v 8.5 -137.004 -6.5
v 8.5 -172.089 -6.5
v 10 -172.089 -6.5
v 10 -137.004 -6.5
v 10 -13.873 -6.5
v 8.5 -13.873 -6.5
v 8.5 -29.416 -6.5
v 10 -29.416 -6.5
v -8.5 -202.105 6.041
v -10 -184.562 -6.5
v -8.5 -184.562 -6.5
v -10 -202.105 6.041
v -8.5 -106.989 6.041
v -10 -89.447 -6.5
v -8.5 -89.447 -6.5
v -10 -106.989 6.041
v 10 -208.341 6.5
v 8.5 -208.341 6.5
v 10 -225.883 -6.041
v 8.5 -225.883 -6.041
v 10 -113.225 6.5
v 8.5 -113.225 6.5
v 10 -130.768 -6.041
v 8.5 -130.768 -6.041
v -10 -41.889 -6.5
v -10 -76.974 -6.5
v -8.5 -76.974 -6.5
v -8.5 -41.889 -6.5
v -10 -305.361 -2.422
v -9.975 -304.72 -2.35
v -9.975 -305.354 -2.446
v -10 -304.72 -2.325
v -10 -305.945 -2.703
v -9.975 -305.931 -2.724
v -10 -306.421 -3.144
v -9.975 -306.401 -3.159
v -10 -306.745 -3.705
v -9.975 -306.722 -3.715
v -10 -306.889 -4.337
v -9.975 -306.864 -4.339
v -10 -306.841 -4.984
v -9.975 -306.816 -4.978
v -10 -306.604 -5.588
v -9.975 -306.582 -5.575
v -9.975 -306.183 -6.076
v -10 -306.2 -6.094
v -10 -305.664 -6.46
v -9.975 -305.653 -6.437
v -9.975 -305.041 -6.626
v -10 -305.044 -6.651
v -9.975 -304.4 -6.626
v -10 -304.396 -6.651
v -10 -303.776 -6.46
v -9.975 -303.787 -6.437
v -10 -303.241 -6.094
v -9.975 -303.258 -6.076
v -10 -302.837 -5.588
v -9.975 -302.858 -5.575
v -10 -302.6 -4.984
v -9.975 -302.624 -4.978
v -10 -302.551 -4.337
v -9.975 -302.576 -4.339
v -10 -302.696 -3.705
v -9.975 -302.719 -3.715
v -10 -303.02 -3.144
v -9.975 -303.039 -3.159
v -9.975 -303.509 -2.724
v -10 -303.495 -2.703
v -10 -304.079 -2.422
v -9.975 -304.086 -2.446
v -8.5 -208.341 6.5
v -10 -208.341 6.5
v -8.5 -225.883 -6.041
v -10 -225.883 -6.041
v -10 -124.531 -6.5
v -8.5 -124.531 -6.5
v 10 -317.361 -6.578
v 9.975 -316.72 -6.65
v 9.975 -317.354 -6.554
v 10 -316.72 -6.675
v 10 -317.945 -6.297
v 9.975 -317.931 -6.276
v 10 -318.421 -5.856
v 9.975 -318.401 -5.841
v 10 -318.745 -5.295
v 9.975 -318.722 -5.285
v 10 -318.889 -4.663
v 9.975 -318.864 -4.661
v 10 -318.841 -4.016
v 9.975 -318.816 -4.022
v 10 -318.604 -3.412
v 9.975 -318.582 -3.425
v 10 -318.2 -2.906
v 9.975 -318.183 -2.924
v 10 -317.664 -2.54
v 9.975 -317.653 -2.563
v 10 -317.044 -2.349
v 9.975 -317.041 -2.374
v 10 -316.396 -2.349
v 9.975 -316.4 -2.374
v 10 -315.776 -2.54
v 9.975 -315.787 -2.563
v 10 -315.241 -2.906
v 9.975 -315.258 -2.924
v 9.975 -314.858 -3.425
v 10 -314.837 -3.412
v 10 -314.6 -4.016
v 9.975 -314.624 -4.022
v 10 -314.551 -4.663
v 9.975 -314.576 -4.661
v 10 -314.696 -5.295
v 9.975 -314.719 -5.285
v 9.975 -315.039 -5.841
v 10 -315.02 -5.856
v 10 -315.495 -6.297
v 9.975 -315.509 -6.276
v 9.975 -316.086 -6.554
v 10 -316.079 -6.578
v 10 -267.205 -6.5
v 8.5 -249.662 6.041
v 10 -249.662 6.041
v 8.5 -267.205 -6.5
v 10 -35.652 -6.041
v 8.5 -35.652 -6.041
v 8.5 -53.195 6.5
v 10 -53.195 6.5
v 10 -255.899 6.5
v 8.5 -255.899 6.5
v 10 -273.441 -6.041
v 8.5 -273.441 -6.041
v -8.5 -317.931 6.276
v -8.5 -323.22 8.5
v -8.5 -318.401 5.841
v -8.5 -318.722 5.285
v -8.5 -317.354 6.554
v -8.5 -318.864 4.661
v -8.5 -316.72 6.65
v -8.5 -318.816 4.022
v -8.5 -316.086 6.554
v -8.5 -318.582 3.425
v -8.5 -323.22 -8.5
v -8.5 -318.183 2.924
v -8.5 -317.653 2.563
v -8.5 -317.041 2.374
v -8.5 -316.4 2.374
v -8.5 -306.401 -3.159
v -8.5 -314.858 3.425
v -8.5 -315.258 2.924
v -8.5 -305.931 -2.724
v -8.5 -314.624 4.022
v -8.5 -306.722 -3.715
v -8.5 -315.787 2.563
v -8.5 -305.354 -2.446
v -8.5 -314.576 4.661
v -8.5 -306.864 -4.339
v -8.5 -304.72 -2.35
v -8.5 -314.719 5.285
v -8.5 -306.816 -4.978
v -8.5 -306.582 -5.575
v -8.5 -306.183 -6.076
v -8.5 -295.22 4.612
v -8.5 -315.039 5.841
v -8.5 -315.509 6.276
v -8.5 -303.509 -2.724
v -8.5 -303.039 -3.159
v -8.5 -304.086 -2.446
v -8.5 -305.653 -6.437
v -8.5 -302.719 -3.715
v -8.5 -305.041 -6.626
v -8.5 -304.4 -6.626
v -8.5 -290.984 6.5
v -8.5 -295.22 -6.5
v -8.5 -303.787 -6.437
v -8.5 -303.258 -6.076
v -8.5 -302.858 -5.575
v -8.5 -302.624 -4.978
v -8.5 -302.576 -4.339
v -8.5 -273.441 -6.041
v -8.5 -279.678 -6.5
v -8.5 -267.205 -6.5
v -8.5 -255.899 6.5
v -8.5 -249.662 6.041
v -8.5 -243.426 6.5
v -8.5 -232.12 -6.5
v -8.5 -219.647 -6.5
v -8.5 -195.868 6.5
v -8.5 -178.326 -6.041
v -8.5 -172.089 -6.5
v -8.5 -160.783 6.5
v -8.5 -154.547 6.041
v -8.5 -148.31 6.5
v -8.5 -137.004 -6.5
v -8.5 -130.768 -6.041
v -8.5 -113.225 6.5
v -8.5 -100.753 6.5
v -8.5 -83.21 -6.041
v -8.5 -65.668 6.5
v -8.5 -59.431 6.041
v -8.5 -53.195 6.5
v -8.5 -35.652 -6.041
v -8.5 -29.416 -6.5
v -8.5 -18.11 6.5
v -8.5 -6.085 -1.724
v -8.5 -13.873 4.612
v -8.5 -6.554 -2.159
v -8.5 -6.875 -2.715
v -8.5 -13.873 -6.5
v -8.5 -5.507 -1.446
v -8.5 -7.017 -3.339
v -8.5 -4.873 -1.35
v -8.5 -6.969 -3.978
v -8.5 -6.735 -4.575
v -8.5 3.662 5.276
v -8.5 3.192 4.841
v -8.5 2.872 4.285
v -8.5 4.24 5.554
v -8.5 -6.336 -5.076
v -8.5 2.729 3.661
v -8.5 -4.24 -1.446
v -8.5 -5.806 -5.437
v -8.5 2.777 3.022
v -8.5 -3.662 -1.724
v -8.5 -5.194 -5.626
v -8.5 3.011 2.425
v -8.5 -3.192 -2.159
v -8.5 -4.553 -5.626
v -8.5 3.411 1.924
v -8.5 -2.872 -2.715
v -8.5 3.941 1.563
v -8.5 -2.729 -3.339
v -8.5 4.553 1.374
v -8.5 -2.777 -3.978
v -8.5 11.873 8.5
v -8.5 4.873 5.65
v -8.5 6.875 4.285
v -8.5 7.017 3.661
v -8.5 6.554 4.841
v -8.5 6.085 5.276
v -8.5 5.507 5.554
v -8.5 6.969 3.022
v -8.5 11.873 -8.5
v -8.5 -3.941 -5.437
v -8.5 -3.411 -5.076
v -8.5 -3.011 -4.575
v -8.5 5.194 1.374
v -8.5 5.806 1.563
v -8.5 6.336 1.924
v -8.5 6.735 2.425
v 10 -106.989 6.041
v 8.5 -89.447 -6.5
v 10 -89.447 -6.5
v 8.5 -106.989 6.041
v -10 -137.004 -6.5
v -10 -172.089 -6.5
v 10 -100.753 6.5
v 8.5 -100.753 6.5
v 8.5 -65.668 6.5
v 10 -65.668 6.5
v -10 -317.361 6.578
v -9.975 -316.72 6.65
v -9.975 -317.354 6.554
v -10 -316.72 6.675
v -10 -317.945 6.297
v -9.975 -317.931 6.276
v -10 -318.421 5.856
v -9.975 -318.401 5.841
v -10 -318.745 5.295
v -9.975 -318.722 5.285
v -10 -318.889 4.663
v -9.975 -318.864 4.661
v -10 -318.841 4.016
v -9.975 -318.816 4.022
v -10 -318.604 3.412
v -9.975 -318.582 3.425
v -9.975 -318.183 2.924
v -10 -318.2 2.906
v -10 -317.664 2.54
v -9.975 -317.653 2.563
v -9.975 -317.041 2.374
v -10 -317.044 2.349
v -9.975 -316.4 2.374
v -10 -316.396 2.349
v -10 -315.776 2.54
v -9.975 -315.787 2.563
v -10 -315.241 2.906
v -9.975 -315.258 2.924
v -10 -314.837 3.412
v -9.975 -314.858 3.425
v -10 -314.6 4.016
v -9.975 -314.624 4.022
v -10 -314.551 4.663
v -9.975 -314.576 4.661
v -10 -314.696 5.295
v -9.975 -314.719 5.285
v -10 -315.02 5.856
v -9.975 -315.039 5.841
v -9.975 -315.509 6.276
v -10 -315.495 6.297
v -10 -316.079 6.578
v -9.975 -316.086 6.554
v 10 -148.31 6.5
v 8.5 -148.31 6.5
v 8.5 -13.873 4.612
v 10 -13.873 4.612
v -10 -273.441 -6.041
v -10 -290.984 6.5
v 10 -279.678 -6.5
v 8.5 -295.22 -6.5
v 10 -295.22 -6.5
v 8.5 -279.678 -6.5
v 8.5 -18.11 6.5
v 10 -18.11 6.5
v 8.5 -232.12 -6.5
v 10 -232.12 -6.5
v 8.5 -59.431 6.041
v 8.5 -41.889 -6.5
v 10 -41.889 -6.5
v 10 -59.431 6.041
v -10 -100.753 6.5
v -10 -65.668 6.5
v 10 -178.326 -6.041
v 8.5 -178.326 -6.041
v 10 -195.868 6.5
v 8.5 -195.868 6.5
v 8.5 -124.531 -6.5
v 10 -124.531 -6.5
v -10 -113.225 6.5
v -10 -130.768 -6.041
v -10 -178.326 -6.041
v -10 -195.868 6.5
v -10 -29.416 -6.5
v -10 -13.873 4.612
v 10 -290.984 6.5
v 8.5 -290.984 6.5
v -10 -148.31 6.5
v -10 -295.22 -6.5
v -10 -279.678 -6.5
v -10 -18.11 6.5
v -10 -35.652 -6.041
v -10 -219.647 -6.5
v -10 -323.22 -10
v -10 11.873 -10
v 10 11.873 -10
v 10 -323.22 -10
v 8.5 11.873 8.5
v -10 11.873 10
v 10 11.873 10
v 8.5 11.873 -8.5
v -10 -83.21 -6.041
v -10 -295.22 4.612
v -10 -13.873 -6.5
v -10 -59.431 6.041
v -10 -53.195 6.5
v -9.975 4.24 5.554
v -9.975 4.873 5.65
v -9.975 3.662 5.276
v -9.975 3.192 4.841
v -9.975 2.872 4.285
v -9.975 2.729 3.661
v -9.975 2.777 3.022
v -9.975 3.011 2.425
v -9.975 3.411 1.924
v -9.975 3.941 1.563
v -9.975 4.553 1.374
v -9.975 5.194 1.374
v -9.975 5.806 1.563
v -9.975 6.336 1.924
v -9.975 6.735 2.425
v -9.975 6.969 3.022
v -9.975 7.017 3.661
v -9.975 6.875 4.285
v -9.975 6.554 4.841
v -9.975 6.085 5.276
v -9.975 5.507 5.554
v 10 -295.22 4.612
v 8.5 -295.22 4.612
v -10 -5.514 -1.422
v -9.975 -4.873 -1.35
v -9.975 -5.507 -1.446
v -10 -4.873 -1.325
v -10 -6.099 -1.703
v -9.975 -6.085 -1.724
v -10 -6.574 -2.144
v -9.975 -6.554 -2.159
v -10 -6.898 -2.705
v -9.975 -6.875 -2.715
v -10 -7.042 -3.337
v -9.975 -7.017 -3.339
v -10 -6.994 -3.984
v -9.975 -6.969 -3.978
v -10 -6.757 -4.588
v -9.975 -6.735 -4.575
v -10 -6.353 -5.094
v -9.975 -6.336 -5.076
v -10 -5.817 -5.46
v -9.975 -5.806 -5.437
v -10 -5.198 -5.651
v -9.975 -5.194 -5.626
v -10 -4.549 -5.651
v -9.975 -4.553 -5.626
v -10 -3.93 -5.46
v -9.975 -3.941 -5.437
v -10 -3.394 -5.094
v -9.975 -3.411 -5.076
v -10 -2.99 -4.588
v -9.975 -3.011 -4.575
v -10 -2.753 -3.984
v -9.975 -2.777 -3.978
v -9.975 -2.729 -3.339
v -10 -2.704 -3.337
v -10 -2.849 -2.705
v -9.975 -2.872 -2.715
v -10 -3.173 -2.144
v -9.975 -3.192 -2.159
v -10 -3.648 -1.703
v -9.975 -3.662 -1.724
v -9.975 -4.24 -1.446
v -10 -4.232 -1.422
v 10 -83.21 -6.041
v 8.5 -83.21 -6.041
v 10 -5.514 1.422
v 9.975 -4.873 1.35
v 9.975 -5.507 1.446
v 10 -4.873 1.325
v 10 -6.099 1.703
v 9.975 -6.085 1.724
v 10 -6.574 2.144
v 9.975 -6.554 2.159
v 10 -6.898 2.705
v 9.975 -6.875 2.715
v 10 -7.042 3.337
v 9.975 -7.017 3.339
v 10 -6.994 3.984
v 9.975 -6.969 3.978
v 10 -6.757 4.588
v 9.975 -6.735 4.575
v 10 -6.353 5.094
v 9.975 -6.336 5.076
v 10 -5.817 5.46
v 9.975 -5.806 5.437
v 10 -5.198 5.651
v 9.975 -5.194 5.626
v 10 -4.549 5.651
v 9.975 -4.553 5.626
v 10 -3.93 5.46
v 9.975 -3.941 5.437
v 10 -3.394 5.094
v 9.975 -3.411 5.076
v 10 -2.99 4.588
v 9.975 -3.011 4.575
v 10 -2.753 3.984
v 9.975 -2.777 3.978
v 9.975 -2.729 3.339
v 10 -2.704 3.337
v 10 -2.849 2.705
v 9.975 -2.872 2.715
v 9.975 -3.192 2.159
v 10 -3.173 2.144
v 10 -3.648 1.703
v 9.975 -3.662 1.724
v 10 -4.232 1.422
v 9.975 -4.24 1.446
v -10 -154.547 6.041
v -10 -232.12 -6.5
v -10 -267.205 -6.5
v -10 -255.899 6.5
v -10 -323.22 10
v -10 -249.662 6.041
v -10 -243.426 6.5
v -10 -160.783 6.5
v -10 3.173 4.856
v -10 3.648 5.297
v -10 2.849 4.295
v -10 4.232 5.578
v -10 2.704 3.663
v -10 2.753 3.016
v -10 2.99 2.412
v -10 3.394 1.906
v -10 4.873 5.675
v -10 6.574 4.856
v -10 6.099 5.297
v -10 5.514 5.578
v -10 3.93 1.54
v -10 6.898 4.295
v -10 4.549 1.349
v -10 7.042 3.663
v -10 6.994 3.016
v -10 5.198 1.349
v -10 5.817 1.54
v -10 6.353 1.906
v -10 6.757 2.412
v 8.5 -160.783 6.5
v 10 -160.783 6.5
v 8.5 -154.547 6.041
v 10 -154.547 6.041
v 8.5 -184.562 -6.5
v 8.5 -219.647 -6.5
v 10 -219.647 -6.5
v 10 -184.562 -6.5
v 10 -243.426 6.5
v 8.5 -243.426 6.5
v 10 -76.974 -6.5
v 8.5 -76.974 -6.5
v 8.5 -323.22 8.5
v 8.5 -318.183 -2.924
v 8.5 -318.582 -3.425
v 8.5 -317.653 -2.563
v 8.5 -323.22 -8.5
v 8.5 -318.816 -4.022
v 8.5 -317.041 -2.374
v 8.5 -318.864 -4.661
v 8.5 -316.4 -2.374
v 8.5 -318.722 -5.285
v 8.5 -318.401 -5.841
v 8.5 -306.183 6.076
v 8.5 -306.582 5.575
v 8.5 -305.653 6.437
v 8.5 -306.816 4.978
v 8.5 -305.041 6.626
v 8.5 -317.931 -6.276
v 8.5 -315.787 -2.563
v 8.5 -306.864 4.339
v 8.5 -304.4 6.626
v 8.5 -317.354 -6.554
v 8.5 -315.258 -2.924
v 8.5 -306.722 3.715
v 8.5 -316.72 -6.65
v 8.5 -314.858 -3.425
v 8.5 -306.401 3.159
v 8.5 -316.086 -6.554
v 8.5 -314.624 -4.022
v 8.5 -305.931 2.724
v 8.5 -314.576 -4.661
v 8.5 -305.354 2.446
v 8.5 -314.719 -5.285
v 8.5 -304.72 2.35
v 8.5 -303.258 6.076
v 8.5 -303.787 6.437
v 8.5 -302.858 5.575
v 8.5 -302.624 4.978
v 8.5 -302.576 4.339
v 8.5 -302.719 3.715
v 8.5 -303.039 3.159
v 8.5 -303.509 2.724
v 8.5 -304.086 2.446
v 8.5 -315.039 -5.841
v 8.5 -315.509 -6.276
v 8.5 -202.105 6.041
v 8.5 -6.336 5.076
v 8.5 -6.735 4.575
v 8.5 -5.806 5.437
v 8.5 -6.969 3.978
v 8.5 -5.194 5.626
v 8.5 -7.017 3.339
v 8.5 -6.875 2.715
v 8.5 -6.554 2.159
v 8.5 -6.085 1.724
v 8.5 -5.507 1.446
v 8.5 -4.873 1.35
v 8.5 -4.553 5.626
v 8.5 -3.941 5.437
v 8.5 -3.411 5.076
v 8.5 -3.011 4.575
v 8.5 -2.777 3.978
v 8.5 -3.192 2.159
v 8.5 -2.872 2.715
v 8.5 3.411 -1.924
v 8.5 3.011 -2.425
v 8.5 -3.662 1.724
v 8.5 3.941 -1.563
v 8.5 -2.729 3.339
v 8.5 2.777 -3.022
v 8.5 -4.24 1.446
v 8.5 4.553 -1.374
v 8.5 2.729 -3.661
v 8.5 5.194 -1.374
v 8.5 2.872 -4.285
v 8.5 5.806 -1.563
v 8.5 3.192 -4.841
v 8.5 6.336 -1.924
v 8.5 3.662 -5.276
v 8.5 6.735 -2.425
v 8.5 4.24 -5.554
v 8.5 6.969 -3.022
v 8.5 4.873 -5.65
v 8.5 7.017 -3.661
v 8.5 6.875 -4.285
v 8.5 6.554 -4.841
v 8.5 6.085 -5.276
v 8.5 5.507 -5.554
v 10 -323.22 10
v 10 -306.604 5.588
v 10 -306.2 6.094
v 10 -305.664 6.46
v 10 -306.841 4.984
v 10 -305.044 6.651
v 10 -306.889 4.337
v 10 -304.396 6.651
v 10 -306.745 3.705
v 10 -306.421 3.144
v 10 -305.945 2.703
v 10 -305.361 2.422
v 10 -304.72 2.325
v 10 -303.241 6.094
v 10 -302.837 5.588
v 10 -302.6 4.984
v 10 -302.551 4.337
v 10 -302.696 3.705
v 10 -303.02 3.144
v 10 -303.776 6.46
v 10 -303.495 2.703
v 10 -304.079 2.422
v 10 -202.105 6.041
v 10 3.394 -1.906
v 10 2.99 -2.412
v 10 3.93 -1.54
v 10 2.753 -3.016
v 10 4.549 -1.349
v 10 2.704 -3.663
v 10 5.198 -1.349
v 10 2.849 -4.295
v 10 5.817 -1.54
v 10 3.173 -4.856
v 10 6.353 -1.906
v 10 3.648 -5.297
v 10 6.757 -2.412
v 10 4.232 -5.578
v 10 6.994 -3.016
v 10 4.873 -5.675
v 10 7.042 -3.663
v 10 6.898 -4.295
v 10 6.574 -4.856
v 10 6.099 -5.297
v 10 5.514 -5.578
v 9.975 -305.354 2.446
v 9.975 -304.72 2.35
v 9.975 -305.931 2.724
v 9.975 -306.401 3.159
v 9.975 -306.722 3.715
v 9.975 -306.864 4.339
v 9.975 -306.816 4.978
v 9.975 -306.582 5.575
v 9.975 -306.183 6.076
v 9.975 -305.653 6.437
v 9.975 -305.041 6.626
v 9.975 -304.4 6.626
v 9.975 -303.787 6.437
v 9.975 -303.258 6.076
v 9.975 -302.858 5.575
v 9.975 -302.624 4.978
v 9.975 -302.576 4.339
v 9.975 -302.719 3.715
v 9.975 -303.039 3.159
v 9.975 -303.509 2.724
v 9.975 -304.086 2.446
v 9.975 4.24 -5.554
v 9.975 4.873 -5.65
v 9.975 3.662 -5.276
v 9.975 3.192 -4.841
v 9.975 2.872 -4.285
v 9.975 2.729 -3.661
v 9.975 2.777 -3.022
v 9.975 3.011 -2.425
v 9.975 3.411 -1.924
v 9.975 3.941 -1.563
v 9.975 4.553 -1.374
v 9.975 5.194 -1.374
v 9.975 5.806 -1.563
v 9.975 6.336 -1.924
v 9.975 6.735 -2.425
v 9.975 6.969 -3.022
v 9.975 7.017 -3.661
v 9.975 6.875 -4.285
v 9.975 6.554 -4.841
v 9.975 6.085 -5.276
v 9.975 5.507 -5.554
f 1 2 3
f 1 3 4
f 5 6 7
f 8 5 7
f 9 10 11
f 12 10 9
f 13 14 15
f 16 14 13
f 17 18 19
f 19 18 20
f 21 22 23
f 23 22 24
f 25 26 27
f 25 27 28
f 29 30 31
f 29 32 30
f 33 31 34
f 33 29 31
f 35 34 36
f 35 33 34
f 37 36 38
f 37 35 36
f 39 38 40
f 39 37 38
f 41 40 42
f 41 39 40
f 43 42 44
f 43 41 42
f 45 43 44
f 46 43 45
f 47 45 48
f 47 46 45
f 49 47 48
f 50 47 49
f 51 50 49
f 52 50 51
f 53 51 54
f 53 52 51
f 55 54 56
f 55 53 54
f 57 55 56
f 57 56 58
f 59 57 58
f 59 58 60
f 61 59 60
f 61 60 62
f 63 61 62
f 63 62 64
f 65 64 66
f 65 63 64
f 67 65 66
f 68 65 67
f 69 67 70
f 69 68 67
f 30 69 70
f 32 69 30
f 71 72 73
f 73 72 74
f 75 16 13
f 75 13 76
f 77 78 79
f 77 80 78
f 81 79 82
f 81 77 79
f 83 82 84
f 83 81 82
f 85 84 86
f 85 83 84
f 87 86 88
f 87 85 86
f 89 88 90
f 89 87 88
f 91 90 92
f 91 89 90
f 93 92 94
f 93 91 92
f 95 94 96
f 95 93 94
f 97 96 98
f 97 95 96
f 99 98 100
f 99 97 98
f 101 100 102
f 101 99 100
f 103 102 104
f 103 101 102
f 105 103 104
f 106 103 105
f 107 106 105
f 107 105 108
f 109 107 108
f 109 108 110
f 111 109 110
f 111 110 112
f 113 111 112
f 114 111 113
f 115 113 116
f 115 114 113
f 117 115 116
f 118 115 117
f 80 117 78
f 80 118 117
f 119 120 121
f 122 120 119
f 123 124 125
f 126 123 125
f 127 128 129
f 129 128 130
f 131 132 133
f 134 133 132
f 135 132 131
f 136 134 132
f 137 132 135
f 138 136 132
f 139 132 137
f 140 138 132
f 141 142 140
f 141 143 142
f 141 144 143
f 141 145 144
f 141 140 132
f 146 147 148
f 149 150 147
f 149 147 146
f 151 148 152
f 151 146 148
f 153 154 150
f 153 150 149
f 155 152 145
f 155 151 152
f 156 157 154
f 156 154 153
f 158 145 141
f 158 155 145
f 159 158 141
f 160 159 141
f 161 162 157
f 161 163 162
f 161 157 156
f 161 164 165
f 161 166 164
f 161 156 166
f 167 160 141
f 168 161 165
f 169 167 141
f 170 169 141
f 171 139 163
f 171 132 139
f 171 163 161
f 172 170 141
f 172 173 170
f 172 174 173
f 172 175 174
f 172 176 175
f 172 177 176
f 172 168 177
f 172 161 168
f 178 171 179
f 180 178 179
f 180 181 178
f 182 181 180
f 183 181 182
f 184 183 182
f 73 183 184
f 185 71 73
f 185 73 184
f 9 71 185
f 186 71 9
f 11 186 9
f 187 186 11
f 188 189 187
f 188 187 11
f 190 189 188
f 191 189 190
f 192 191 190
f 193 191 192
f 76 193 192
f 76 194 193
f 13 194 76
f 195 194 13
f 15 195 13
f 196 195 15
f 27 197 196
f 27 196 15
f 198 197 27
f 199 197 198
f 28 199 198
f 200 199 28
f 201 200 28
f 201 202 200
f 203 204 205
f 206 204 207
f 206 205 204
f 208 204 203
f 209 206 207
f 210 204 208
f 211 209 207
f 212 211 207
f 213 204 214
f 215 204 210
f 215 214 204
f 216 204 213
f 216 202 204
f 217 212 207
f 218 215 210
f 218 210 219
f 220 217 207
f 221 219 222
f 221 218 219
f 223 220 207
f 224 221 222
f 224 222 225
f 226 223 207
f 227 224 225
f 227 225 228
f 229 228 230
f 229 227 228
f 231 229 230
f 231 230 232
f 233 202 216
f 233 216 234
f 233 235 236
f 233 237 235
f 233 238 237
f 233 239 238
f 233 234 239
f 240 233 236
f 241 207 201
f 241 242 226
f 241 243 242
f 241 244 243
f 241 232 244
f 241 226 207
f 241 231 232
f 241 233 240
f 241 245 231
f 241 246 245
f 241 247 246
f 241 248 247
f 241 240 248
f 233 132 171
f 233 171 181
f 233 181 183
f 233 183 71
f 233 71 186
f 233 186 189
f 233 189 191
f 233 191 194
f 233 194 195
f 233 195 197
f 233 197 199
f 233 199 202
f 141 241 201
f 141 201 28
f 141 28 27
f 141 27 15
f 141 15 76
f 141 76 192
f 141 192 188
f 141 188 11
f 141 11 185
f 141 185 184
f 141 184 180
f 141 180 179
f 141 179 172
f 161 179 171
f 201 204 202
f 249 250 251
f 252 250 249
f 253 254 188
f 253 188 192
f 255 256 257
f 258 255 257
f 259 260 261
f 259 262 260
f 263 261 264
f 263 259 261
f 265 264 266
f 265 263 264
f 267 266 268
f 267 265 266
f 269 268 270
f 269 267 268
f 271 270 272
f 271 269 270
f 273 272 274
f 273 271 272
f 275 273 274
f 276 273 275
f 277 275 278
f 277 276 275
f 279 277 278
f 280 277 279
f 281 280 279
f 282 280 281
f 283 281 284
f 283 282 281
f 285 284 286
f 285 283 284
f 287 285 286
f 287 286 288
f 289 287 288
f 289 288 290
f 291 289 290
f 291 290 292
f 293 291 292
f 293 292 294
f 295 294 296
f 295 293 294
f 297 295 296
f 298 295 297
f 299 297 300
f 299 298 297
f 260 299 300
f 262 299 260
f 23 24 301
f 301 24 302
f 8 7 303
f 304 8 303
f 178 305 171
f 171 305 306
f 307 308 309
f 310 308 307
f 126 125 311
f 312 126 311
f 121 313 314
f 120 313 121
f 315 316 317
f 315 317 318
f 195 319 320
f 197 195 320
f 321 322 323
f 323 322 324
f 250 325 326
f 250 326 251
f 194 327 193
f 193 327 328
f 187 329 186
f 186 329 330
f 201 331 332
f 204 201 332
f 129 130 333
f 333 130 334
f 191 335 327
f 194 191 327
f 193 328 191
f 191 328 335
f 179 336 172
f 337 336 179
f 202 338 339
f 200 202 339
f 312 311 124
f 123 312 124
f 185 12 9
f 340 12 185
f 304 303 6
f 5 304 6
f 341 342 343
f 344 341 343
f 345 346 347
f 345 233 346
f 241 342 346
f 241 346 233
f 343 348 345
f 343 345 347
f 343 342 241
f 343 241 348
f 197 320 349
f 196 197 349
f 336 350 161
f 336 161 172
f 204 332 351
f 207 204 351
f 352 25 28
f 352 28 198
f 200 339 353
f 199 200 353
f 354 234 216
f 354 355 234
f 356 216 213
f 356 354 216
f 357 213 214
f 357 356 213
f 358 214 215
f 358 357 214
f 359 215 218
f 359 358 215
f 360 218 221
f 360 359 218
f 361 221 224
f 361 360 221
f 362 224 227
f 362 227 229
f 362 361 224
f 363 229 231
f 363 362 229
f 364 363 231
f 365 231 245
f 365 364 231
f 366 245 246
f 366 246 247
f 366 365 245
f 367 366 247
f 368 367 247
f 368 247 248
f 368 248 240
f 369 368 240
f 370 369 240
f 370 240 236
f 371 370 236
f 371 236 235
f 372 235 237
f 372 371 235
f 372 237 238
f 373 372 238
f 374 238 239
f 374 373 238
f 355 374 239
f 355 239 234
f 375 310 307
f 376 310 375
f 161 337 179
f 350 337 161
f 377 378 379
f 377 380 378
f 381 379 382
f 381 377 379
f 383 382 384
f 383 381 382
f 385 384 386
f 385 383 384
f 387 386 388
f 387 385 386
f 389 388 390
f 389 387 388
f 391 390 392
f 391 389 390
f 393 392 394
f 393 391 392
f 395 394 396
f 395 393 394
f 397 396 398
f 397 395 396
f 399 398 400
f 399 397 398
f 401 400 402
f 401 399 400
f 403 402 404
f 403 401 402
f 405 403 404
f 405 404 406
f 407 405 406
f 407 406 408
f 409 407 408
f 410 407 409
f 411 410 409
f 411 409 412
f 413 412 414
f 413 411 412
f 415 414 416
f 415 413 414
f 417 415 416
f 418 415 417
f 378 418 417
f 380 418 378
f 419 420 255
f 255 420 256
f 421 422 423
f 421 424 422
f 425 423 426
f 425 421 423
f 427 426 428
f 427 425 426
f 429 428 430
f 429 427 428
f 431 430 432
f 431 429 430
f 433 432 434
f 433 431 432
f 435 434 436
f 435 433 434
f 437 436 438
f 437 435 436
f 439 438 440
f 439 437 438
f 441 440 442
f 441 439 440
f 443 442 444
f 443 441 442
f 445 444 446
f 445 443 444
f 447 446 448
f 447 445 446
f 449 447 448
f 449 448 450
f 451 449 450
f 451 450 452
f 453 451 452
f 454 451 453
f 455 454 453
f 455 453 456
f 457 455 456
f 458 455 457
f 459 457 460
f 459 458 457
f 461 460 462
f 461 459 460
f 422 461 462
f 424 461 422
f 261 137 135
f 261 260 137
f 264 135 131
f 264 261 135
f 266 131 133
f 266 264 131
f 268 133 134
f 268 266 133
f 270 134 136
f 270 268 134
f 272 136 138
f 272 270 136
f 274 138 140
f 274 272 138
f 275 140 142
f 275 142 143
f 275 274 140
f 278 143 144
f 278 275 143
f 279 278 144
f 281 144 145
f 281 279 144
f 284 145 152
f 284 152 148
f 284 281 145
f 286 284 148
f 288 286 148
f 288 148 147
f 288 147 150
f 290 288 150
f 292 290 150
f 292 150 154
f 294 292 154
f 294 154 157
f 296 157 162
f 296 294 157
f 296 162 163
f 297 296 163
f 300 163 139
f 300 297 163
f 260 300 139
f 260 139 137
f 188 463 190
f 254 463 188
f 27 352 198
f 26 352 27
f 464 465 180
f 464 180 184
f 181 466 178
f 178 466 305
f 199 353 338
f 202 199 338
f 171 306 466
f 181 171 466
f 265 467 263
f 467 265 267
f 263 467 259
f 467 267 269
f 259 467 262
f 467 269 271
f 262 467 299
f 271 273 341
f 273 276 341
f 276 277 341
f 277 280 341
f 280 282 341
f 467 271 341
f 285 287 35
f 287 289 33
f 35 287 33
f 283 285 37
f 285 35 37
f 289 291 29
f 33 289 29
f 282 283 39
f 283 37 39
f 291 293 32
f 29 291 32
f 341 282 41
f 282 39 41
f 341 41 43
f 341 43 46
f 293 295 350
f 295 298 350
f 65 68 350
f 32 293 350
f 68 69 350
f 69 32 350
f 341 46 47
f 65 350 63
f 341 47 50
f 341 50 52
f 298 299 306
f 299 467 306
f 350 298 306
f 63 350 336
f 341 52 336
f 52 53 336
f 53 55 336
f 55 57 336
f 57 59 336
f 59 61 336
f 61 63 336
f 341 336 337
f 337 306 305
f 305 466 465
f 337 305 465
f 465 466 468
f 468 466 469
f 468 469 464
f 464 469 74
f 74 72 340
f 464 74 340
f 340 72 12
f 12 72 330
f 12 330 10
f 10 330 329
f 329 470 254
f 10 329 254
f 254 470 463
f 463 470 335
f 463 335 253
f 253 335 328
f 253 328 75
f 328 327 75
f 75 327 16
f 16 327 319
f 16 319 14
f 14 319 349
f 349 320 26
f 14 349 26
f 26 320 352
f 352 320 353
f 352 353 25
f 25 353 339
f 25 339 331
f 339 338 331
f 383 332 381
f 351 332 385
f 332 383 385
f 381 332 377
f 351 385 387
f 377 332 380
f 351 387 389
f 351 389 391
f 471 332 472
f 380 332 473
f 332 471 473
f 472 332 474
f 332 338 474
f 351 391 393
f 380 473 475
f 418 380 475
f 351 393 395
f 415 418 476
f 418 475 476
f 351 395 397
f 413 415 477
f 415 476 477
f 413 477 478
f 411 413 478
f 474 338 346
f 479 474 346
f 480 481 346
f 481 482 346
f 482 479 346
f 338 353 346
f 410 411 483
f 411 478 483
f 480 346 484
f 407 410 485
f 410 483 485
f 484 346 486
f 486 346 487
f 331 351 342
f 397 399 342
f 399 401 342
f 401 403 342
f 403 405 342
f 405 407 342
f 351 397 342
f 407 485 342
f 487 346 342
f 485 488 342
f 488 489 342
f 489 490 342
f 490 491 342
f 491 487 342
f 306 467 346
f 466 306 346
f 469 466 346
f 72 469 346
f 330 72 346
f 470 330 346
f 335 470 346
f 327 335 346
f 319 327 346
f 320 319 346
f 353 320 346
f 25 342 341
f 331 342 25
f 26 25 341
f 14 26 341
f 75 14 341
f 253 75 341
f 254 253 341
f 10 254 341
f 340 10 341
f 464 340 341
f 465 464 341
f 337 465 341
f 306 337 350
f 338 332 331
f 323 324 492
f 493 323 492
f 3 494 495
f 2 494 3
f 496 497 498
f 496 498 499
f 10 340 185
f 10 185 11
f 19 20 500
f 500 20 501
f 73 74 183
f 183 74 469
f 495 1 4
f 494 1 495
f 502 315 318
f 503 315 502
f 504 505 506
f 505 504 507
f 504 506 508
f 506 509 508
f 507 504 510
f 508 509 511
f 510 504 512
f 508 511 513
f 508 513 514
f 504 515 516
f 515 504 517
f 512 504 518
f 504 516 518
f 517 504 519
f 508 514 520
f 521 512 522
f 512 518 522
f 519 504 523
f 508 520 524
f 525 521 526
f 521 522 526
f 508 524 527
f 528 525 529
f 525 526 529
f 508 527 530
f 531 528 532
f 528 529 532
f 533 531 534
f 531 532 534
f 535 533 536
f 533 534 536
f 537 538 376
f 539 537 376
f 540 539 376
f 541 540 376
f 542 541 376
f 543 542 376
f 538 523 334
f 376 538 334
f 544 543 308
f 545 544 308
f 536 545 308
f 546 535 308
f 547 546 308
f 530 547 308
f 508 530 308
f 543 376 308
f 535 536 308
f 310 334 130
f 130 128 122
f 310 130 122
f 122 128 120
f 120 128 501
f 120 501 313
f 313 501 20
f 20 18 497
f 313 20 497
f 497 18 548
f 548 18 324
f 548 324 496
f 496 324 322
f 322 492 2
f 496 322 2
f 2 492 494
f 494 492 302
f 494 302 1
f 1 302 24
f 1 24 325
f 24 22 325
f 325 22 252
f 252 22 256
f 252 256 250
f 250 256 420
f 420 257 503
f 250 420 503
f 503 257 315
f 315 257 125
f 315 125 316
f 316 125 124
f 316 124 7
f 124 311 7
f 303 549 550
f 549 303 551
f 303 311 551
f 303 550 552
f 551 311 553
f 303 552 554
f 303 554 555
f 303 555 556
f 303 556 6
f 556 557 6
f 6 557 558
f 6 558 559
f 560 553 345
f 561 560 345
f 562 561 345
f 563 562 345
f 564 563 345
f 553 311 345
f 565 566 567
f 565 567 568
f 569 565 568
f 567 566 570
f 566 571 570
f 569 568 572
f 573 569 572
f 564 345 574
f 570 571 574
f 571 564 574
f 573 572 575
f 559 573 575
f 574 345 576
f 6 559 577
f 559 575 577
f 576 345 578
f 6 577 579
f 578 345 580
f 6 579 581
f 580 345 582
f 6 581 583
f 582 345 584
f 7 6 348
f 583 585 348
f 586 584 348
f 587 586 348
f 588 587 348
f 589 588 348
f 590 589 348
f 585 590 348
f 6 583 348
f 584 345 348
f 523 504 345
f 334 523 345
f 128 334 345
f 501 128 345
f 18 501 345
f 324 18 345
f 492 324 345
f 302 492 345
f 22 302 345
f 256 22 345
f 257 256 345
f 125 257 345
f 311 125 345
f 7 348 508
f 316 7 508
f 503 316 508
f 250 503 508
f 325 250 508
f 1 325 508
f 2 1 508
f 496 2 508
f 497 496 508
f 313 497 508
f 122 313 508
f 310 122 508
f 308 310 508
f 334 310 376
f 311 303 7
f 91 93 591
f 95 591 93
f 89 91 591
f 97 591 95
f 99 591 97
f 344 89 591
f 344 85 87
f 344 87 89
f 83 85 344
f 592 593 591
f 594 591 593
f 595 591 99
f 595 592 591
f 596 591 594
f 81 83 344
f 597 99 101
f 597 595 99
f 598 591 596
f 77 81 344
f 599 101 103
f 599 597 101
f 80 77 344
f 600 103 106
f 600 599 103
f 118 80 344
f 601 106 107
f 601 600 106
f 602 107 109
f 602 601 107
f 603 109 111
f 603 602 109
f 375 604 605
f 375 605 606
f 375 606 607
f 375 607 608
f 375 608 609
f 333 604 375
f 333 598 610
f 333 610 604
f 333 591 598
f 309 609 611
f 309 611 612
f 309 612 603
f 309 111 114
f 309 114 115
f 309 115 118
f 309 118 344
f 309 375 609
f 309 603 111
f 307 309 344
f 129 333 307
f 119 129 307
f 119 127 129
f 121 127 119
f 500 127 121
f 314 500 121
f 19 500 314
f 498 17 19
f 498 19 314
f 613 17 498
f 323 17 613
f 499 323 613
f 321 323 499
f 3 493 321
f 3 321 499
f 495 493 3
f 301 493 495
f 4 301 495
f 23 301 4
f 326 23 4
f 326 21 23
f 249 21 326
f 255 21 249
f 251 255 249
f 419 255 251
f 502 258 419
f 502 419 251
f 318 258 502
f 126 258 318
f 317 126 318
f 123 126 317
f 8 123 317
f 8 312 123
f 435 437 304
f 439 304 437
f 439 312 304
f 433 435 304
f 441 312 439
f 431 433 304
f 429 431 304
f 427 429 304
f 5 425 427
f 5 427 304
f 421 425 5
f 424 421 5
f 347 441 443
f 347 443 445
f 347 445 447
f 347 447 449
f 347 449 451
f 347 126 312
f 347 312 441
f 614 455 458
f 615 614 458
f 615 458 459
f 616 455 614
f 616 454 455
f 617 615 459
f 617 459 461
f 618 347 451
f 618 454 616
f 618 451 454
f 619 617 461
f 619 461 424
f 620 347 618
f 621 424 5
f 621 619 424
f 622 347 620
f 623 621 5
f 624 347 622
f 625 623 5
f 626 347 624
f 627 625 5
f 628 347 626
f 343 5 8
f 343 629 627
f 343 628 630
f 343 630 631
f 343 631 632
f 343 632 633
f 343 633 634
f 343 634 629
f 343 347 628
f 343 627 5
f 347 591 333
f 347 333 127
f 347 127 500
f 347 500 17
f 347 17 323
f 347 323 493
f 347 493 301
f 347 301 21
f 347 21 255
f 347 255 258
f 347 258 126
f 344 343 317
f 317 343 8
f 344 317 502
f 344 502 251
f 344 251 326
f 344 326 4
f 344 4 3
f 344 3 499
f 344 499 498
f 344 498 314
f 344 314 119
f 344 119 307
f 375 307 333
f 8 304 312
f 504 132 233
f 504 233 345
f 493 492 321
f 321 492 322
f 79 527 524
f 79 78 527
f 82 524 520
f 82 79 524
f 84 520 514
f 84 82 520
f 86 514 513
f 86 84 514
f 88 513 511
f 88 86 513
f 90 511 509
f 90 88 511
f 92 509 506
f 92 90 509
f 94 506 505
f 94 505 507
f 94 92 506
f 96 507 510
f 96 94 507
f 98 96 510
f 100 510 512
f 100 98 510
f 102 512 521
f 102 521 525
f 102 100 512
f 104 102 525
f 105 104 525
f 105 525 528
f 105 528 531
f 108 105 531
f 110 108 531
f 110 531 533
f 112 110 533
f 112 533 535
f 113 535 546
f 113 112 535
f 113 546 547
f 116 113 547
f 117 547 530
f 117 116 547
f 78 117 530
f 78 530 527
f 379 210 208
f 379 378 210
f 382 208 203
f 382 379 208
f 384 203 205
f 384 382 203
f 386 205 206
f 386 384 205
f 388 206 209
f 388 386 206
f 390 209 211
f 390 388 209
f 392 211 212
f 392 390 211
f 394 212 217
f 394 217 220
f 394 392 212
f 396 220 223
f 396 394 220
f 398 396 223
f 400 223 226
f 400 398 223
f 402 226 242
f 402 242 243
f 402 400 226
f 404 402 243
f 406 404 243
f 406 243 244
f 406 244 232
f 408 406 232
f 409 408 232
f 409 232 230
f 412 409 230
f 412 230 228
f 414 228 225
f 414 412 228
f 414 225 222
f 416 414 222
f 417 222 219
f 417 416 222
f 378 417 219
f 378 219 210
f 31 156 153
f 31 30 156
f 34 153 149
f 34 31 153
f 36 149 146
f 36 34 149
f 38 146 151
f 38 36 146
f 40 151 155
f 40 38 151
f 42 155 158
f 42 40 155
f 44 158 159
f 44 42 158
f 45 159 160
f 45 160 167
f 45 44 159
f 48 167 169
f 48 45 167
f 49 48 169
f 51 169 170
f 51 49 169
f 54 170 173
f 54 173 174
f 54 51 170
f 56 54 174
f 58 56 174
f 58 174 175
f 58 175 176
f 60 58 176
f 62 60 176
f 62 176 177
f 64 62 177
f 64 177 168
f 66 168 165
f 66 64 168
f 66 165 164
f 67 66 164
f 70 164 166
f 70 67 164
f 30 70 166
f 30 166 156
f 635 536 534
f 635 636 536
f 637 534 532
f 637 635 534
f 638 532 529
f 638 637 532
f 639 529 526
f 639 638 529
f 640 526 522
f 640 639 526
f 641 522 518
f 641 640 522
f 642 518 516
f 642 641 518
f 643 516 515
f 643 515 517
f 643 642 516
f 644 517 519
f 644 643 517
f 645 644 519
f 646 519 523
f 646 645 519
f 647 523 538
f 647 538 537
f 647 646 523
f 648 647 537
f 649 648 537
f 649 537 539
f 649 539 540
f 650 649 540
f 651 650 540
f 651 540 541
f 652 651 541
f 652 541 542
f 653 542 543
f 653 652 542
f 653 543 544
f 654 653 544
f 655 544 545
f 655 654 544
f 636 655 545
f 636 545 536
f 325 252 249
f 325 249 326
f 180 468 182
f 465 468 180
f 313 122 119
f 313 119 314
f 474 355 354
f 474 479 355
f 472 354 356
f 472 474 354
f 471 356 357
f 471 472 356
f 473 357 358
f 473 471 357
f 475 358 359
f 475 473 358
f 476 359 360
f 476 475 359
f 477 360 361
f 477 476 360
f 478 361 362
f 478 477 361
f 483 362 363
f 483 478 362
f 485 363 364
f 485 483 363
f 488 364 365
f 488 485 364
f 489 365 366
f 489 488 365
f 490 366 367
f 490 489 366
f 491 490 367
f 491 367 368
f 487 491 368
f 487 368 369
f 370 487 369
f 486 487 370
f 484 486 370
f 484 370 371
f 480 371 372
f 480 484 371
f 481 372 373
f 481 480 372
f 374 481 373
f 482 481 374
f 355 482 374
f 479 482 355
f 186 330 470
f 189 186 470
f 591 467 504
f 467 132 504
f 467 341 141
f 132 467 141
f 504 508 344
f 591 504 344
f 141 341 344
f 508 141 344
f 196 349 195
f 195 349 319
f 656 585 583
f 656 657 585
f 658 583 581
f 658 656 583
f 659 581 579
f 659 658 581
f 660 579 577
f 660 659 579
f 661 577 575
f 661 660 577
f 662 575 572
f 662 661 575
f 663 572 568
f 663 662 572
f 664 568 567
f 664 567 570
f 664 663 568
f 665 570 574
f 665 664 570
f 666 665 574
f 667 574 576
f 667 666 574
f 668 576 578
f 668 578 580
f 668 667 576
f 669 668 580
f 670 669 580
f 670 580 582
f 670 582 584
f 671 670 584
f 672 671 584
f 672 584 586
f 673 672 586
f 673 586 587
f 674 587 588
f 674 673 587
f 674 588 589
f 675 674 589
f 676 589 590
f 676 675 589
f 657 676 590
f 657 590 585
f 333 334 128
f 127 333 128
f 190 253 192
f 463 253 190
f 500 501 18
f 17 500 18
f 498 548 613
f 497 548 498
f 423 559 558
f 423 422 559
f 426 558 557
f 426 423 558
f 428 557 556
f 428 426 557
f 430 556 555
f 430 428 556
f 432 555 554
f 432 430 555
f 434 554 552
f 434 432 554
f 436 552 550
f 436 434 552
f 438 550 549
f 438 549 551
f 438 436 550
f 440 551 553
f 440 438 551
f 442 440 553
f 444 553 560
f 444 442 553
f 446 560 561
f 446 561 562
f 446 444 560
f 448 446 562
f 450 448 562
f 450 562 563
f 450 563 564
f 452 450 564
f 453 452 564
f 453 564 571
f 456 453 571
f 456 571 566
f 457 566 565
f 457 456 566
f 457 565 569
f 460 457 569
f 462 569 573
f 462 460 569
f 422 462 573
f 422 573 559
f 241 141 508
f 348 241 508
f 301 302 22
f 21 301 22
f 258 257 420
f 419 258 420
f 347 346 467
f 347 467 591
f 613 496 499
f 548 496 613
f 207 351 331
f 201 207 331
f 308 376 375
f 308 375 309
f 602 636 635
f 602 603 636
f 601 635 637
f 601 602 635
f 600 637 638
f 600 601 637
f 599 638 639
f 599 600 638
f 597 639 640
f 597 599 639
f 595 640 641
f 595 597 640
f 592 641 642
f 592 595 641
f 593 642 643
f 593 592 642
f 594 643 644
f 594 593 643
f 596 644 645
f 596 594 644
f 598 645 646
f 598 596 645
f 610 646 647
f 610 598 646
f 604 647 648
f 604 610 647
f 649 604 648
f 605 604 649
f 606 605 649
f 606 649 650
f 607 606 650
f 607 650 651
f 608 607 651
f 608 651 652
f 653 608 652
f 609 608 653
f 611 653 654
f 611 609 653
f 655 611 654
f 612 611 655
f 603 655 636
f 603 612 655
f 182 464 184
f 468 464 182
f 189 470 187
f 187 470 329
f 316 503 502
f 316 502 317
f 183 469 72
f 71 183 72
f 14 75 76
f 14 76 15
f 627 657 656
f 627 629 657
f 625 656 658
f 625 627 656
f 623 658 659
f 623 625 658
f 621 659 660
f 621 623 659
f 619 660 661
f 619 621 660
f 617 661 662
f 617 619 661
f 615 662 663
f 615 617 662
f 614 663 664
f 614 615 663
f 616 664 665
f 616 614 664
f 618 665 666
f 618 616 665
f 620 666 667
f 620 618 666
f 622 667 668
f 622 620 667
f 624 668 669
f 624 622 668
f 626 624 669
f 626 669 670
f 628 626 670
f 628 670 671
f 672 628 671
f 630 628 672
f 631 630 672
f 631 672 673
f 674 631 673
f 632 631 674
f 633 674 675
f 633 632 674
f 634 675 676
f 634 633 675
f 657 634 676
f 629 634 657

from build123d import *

# Parameters (mm, degrees)
BOSS_EXTRUDE1_START           = 11.873397
SKETCH2_W                     = 20
SKETCH2_H                     = 20
SKETCH2_W_2                   = 17
SKETCH2_H_2                   = 17
BOSS_EXTRUDE1_DEPTH           = 335.093577
M4_CLEARANCE_HOLE1_AT_2_COUNT = 2
M4_CLEARANCE_HOLE1_AT_2_PITCH = 12
M4_CLEARANCE_HOLE2_AT_2_COUNT = 2
M4_CLEARANCE_HOLE2_AT_2_PITCH = 12
M4_CLEARANCE_HOLE3_AT_2_COUNT = 2
M4_CLEARANCE_HOLE3_AT_2_PITCH = 14.999999999
M4_CLEARANCE_HOLE4_AT_2_COUNT = 2
M4_CLEARANCE_HOLE4_AT_2_PITCH = 14.999999999
CUT_EXTRUDE1_DEPTH            = 324.529418692
CUT_EXTRUDE1_DEPTH_BACK       = 324.529418692


with BuildPart() as part:
    # Sketch2 → Boss-Extrude1 (new body)
    with BuildSketch(Plane(origin=(0, 0, 0), x_dir=(1, 0, 0), z_dir=(0, 1, 0)).offset(BOSS_EXTRUDE1_START)):
        Rectangle(SKETCH2_W, SKETCH2_H)
        Rectangle(SKETCH2_W_2, SKETCH2_H_2, mode=Mode.SUBTRACT)
    extrude(amount=-BOSS_EXTRUDE1_DEPTH)

    # Sketch5 → M4 Clearance Hole1 (revolve, cut)
    with BuildSketch(Plane(origin=(-10, 4.873397172, 3.5), x_dir=(0, 0, 1), z_dir=(0, 1, 0))):
        Polygon((0, 0), (0, 1.5), (2.15, 1.5), (2.15, 0.025), (2.175, 0), align=None)
    m4_clearance_hole1 = revolve(axis=Axis((-16.35, 4.873397172, 3.5), (1, 0, 0)), mode=Mode.SUBTRACT)

    # M4 Clearance Hole1 at 2: M4 Clearance Hole1 ×2
    with Locations(*[Vector(0, -0.8122328620674136, -0.5833333333333335) * (i * M4_CLEARANCE_HOLE1_AT_2_PITCH) for i in range(1, M4_CLEARANCE_HOLE1_AT_2_COUNT)]):
        add(m4_clearance_hole1, mode=Mode.SUBTRACT)

    # Sketch8 → M4 Clearance Hole2 (revolve, cut)
    with BuildSketch(Plane(origin=(10, 4.873397172, -3.5), x_dir=(0, 0, -1), z_dir=(0, 1, 0))):
        Polygon((0, 0), (0, 1.5), (2.15, 1.5), (2.15, 0.025), (2.175, 0), align=None)
    m4_clearance_hole2 = revolve(axis=Axis((16.35, 4.873397172, -3.5), (-1, 0, 0)), mode=Mode.SUBTRACT)

    # M4 Clearance Hole2 at 2: M4 Clearance Hole2 ×2
    with Locations(*[Vector(0, -0.8122328620674134, 0.5833333333333337) * (i * M4_CLEARANCE_HOLE2_AT_2_PITCH) for i in range(1, M4_CLEARANCE_HOLE2_AT_2_COUNT)]):
        add(m4_clearance_hole2, mode=Mode.SUBTRACT)

    # Sketch10 → M4 Clearance Hole3 (revolve, cut)
    with BuildSketch(Plane(origin=(-10, -304.720180379, -4.5), x_dir=(0, 0, 1), z_dir=(0, 1, 0))):
        Polygon((0, 0), (0, 1.5), (2.15, 1.5), (2.15, 0.025), (2.175, 0), align=None)
    m4_clearance_hole3 = revolve(axis=Axis((-16.35, -304.720180379, -4.5), (1, 0, 0)), mode=Mode.SUBTRACT)

    # M4 Clearance Hole3 at 2: M4 Clearance Hole3 ×2
    with Locations(*[Vector(0, -0.7999999999715266, 0.6000000000379647) * (i * M4_CLEARANCE_HOLE3_AT_2_PITCH) for i in range(1, M4_CLEARANCE_HOLE3_AT_2_COUNT)]):
        add(m4_clearance_hole3, mode=Mode.SUBTRACT)

    # Sketch12 → M4 Clearance Hole4 (revolve, cut)
    with BuildSketch(Plane(origin=(10, -304.720180379, 4.5), x_dir=(0, 0, -1), z_dir=(0, 1, 0))):
        Polygon((0, 0), (0, 1.5), (2.15, 1.5), (2.15, 0.025), (2.175, 0), align=None)
    m4_clearance_hole4 = revolve(axis=Axis((16.35, -304.720180379, 4.5), (-1, 0, 0)), mode=Mode.SUBTRACT)

    # M4 Clearance Hole4 at 2: M4 Clearance Hole4 ×2
    with Locations(*[Vector(0, -0.7999999999715265, -0.6000000000379647) * (i * M4_CLEARANCE_HOLE4_AT_2_PITCH) for i in range(1, M4_CLEARANCE_HOLE4_AT_2_COUNT)]):
        add(m4_clearance_hole4, mode=Mode.SUBTRACT)

    # Sketch13 → Cut-Extrude1 (cut, two sides: drawn at the far end of the back side and taken through both)
    with BuildSketch(Plane(origin=(0, 0, 0), x_dir=(0, 0, -1), z_dir=(1, 0, 0)).offset(-CUT_EXTRUDE1_DEPTH_BACK)):
        Polygon((6.5, -279.677709563), (-4.611616577, -295.220180379), (6.5, -295.220180379), align=None)
        Polygon((-6.5, -255.898810962), (6.04145572, -273.441281778), (-6.5, -290.983752595), align=None)
        Polygon((6.5, -232.119912362), (-6.04145572, -249.662383178), (6.5, -267.204853994), align=None)
        Polygon((-6.5, -208.341013761), (6.04145572, -225.883484577), (-6.5, -243.425955393), align=None)
        Polygon((6.5, -184.56211516), (-6.04145572, -202.104585977), (6.5, -219.647056793), align=None)
        Polygon((-6.5, -160.78321656), (6.04145572, -178.325687376), (-6.5, -195.868158192), align=None)
        Polygon((6.5, -137.004317959), (-6.04145572, -154.546788776), (6.5, -172.089259592), align=None)
        Polygon((-6.5, -113.225419359), (6.04145572, -130.767890175), (-6.5, -148.310360991), align=None)
        Polygon((6.5, -89.446520758), (-6.04145572, -106.988991575), (6.5, -124.531462391), align=None)
        Polygon((-6.5, -65.667622158), (6.04145572, -83.210092974), (-6.5, -100.75256379), align=None)
        Polygon((-6.04145572, -59.431194373), (6.5, -76.97366519), (6.5, -41.888723557), align=None)
        Polygon((-6.5, -18.109824957), (6.04145572, -35.652295773), (-6.5, -53.194766589), align=None)
        Polygon((6.5, -13.873397172), (6.5, -29.415867989), (-4.611616577, -13.873397172), align=None)
    extrude(amount=CUT_EXTRUDE1_DEPTH + CUT_EXTRUDE1_DEPTH_BACK, mode=Mode.SUBTRACT)


solid = part.part
